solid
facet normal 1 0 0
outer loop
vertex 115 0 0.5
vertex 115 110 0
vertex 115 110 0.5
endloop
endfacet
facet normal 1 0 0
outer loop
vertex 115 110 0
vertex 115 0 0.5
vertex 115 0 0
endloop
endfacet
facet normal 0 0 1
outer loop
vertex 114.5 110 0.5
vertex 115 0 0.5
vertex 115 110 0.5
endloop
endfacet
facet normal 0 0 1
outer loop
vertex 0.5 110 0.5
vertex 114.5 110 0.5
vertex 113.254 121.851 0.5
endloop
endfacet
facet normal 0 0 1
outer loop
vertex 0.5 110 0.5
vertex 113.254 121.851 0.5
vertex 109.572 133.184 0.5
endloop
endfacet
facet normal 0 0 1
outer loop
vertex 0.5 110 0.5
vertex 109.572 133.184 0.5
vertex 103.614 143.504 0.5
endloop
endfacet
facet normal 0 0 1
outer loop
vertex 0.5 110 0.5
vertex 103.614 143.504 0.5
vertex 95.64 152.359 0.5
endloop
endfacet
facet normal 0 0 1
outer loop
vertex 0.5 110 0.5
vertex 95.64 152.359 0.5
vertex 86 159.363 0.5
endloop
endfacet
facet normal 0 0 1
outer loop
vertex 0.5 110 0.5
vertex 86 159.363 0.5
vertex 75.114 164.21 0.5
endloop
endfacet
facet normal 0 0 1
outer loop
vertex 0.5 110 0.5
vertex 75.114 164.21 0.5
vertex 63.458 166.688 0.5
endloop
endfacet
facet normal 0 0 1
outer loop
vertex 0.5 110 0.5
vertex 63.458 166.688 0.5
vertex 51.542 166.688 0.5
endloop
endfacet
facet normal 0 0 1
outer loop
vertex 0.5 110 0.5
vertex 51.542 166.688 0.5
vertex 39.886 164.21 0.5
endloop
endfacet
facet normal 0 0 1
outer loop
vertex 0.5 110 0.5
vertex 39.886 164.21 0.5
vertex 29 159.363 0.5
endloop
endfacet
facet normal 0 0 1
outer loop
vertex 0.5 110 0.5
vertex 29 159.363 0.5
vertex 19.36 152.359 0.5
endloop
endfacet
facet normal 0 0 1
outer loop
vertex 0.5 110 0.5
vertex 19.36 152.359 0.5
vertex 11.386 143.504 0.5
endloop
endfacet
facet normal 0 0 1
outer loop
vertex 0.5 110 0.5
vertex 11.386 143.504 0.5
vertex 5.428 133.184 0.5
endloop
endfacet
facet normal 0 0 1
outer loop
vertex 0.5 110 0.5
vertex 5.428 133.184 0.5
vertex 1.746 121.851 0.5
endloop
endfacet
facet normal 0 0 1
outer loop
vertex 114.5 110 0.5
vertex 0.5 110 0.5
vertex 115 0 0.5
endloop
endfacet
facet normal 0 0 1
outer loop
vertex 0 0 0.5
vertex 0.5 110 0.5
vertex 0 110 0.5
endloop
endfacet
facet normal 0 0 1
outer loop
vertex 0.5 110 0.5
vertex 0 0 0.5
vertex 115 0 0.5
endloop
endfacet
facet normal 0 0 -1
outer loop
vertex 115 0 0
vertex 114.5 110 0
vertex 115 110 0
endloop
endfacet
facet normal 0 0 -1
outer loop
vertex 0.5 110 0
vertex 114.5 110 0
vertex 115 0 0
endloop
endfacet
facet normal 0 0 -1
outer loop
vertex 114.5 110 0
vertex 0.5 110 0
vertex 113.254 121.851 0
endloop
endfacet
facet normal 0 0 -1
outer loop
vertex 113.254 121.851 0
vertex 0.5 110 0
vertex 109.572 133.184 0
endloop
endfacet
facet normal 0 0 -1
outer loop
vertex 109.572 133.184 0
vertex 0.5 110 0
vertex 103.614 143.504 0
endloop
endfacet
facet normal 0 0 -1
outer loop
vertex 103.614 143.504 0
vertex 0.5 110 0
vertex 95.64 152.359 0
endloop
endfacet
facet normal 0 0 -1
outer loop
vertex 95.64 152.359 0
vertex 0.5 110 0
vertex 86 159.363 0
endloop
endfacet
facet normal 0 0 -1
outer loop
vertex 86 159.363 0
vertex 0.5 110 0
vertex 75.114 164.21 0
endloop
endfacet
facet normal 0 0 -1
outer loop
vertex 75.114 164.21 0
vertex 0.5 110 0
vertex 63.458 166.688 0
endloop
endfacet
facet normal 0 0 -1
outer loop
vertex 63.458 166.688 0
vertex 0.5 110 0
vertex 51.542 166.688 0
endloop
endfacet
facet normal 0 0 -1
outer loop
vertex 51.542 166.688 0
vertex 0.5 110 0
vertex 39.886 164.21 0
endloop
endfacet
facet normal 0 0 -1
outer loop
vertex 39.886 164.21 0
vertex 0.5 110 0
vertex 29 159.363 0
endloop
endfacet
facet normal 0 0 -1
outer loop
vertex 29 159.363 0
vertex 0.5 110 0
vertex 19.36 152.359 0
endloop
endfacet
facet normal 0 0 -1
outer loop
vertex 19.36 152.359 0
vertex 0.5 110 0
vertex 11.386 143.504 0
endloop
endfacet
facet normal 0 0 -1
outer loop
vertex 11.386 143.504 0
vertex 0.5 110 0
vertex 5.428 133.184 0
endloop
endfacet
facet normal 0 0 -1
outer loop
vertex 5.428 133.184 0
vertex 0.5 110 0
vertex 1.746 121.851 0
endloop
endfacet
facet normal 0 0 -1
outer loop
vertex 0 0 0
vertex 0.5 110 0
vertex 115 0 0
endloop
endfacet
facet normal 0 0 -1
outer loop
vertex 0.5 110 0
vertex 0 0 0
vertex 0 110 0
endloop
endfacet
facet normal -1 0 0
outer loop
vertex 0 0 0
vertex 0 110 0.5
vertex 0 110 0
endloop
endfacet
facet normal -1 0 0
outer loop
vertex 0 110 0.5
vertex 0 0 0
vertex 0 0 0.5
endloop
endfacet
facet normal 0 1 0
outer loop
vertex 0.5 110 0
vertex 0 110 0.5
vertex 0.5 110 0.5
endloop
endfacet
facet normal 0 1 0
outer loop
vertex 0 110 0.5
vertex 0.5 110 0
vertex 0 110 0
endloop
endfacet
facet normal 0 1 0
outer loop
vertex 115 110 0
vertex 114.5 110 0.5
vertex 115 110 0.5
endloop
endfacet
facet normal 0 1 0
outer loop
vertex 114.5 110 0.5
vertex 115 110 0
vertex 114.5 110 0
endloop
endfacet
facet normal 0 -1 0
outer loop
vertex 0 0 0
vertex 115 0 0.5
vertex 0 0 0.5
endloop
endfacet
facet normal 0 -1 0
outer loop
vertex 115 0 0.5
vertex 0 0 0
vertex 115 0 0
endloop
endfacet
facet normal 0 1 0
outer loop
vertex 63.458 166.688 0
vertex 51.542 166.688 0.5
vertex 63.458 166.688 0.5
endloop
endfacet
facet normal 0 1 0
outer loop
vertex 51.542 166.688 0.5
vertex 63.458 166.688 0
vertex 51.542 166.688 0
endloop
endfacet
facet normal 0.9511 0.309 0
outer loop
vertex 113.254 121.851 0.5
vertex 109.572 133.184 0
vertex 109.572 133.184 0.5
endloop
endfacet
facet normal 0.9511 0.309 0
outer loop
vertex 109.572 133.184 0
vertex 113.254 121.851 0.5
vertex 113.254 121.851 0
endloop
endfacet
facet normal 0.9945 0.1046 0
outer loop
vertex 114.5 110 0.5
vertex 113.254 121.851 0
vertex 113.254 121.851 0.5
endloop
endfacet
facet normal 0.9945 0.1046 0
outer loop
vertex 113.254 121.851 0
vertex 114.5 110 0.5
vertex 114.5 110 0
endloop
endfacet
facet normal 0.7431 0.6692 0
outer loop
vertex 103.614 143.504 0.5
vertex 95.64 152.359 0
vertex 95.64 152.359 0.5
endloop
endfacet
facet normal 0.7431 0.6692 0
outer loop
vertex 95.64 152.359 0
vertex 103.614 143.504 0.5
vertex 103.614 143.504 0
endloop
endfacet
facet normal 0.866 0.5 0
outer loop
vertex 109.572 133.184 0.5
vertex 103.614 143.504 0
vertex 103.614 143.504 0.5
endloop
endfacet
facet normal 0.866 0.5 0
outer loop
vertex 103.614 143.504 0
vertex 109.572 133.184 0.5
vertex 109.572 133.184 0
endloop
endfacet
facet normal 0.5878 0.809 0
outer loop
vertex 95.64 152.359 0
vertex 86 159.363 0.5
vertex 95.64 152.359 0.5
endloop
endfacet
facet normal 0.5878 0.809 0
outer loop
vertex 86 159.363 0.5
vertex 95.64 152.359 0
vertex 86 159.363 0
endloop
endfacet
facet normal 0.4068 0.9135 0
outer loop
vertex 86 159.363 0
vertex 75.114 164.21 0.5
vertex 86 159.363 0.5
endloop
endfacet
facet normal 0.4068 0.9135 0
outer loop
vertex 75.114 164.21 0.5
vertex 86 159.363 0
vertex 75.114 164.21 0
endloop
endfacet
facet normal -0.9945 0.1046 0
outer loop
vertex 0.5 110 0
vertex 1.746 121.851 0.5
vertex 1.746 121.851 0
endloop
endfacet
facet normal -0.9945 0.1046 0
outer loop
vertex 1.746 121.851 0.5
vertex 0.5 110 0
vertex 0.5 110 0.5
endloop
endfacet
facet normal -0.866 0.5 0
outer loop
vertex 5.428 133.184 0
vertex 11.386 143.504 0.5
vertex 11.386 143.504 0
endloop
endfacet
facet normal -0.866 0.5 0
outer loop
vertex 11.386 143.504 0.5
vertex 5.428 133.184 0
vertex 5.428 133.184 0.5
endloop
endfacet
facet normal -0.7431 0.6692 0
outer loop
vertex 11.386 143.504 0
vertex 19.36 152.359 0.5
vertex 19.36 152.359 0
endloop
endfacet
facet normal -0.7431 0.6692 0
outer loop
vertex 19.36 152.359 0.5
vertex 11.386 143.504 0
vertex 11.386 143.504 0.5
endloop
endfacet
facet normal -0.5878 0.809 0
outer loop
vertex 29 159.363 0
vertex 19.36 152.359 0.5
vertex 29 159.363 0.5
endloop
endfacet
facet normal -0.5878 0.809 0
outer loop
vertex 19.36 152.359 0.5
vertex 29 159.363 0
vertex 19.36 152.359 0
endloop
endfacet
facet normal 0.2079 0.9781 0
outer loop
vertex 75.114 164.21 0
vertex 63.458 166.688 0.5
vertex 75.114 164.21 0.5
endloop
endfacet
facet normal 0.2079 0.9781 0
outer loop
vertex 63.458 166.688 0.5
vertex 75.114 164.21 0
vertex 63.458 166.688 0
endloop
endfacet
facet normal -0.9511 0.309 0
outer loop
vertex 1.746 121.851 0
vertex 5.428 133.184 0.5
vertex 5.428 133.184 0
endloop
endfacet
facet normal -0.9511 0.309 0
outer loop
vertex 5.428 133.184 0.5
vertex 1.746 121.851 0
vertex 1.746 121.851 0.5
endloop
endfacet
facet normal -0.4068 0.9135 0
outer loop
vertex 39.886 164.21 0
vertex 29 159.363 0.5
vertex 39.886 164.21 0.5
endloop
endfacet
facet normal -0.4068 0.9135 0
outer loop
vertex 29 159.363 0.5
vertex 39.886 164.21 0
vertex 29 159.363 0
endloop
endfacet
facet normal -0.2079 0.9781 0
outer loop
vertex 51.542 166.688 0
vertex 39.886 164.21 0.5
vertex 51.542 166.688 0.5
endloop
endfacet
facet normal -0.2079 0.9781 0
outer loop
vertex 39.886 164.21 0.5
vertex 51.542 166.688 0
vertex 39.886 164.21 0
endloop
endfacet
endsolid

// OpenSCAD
//print two of this in Soft PLA


Lx = 2.5;
Rx = 97.5;


//body
module body(){
	translate([0,0,0]) cube(size=[115,110,0.5]);
	translate([57.5,110,0]) cylinder(h=0.5, r=57);
}

body();


//holes? for attaching two pieces together (sewing)?
module hole(x,y){
	translate([x,y,-1])
	cylinder(h=3, r=1);
}
/*
module arcHoles(){
	for ( i = [0:20] ){
		rotate(i*180/21, [0,0,1])
		translate([0,45,-1])
		cylinder(h=3, r=1);
	}
}
*/
/*
//with holes?
difference(){
	body();

	for (i = [5,10,15,20,25,30,35,40,45,50,55,60,65,70,75,80,85,90,95]){
		translate([i,12,-1])
		cylinder(h=3, r=1);
	}

	//hole(Lx, 12);
	//hole(Rx, 12);
	hole(Lx, 17);
	hole(Rx, 17);
	hole(Lx, 22);
	hole(Rx, 22);
	hole(Lx, 27);
	hole(Rx, 27);
	hole(Lx, 32);
	hole(Rx, 32);
	hole(Lx, 37);
	hole(Rx, 37);
	hole(Lx, 42);
	hole(Rx, 42);
	hole(Lx, 47);
	hole(Rx, 47);
	hole(Lx, 52);
	hole(Rx, 52);
	hole(Lx, 57);
	hole(Rx, 57);
	hole(Lx, 62);
	hole(Rx, 62);
	hole(Lx, 67);
	hole(Rx, 67);
	hole(Lx, 72);
	hole(Rx, 72);
	hole(Lx, 77);
	hole(Rx, 77);
	hole(Lx, 82);
	hole(Rx, 82);
	hole(Lx, 87);
	hole(Rx, 87);
	hole(Lx, 92);
	hole(Rx, 92);
	hole(Lx, 97);
	hole(Rx, 97);
	hole(Lx, 102);
	hole(Rx, 102);
	hole(Lx, 107);
	hole(Rx, 107);
	hole(Lx, 112);
	hole(Rx, 112);

	translate([50,110,0]) rotate([0,0,-90]) arcHoles();

}

*/
